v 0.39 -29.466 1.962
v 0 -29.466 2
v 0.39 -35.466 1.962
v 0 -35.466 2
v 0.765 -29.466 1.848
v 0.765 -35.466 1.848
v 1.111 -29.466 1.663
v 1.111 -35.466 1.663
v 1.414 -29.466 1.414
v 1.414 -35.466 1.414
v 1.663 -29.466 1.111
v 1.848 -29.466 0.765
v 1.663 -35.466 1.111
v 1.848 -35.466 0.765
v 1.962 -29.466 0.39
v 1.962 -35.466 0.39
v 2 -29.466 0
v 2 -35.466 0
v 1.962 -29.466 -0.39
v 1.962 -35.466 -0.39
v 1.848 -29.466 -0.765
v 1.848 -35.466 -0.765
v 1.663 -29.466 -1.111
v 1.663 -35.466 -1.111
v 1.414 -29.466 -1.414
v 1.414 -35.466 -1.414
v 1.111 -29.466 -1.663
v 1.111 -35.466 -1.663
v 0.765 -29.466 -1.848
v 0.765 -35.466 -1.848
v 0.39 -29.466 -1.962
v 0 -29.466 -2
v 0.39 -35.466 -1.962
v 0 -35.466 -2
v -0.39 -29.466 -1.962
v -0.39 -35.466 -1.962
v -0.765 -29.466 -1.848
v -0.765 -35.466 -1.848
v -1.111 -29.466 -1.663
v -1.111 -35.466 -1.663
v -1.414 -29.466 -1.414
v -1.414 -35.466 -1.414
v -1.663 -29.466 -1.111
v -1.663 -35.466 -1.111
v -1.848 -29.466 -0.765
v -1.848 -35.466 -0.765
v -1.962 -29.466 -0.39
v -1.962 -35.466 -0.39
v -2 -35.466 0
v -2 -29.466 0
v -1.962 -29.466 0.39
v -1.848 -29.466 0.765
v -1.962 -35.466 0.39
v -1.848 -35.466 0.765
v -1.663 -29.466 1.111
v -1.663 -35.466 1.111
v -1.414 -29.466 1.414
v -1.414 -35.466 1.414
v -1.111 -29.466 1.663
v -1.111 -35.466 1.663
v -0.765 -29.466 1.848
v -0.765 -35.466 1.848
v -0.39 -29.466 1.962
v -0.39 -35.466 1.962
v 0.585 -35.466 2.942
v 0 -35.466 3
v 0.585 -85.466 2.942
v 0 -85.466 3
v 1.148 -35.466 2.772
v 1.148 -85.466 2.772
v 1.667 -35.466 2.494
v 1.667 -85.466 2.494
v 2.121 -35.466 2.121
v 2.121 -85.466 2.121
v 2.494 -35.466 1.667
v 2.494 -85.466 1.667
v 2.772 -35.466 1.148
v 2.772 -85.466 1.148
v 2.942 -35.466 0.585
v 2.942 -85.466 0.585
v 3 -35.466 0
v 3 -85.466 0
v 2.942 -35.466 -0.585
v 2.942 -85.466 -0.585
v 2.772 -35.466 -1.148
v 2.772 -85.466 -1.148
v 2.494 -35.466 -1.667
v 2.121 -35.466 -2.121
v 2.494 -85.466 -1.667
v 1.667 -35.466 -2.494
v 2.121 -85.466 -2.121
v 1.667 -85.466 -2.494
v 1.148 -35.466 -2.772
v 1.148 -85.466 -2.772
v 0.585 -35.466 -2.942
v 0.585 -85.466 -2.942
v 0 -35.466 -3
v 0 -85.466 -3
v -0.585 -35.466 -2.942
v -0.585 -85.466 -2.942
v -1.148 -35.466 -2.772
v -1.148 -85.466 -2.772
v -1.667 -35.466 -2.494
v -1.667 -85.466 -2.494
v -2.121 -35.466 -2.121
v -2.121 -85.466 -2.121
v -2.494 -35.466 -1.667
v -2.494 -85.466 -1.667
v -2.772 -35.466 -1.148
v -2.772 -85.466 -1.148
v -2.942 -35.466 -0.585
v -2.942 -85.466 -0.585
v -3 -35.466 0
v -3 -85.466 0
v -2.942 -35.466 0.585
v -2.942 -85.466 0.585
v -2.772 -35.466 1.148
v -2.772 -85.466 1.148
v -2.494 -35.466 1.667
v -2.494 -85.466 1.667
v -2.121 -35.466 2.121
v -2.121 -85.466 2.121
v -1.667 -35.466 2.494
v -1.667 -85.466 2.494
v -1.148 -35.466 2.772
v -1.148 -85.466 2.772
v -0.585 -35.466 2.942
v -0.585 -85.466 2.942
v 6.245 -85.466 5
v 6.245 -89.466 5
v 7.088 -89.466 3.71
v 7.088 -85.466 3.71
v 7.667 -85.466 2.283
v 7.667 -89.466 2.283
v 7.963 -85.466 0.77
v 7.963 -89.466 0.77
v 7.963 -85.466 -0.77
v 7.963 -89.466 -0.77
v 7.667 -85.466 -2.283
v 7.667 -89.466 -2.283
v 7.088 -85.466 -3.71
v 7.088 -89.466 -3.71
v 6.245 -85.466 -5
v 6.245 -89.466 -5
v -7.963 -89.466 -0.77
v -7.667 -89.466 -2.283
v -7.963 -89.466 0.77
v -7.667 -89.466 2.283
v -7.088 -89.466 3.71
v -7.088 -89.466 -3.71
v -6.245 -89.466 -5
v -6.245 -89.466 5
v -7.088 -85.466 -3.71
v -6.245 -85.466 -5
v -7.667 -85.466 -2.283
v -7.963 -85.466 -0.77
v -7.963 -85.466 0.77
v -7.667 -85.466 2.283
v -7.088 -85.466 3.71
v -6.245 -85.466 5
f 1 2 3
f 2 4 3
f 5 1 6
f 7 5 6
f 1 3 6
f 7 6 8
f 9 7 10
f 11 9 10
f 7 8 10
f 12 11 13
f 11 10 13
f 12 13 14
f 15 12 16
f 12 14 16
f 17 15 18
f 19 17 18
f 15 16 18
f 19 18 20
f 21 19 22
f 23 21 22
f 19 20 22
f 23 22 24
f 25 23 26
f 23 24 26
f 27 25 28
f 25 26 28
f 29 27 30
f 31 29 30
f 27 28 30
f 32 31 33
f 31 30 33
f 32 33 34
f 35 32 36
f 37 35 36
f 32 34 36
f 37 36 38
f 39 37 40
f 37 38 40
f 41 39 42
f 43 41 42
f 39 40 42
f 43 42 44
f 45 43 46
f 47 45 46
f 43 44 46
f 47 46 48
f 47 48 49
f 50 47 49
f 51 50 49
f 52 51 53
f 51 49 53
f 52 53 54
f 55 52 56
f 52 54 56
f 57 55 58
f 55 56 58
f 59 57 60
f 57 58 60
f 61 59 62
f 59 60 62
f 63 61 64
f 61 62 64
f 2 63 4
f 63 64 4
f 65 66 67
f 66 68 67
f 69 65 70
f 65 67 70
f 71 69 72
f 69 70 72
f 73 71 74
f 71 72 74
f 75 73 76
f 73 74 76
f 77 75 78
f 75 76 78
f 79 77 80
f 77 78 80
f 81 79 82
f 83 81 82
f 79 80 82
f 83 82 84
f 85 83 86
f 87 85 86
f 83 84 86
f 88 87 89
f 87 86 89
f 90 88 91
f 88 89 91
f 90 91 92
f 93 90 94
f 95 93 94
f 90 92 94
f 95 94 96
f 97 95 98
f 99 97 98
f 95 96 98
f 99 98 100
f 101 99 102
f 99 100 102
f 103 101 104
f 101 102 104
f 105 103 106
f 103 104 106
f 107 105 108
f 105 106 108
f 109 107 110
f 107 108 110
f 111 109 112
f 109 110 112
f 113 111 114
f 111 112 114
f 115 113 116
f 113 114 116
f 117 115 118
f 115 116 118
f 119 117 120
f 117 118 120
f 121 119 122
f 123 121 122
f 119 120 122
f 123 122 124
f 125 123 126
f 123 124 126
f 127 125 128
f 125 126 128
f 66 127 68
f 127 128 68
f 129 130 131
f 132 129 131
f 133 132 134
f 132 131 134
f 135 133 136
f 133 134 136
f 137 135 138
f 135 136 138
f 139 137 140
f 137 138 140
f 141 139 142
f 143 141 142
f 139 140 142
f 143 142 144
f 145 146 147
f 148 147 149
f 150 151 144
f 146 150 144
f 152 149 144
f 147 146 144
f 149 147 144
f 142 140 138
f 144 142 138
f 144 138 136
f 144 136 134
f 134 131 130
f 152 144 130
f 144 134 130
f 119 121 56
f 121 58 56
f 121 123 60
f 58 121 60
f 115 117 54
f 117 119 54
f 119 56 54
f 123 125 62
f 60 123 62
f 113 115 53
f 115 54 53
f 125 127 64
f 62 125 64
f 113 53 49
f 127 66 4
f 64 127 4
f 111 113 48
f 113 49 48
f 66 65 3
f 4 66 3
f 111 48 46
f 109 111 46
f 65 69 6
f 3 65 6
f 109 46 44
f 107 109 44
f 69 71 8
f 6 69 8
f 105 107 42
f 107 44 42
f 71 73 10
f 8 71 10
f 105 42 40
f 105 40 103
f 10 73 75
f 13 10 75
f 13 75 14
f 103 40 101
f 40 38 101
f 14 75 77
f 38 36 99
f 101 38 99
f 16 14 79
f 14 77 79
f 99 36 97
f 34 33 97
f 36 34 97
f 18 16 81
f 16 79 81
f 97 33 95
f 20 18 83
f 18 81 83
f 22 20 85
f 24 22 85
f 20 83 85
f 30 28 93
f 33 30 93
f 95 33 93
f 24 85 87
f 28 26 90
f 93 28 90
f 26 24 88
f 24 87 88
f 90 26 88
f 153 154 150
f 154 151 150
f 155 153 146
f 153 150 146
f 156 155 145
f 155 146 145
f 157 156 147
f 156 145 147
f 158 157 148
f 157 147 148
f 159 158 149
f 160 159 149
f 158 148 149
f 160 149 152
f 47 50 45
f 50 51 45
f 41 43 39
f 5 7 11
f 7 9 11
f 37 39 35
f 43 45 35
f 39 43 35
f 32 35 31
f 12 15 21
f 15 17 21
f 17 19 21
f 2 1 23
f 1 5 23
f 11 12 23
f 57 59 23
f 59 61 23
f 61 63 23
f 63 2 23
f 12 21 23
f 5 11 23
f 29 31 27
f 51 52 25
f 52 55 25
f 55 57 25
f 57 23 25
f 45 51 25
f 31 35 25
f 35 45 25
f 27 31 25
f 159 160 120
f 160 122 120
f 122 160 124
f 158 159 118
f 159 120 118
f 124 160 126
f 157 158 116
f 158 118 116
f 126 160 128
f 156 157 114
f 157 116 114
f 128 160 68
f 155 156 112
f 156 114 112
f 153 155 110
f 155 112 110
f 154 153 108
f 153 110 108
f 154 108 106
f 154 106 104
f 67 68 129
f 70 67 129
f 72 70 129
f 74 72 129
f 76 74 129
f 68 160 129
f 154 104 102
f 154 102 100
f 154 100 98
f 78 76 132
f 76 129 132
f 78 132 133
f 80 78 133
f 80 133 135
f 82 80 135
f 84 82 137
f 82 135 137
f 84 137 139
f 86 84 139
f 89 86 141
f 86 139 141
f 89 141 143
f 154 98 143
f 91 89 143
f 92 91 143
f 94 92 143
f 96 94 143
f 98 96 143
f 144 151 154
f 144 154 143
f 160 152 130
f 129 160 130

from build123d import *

# Parameters (mm, degrees)
F3_W     = 19.09311
F3_H     = 4.934694
F3_H_2   = 4.746388
F4_DEPTH = 4


with BuildPart() as f2:
    # F0 (on Right) → F2 (revolve)
    with BuildSketch(Plane.YZ):
        Polygon((-89.465849, 8), (-89.465849, 0), (-29.465849, 0), (-29.465849, 2), (-35.465849, 2), (-35.465849, 3), (-85.465849, 3), (-85.465849, 8), align=None)
    revolve(axis=Axis((0, -60.270485, 0), (0, 1, 0)))

    # F3 (on face) → F4 (cut, through all)
    with BuildSketch(Plane.XZ.offset(89.465849)):
        with Locations((0.222466, 7.467347)):
            Rectangle(F3_W, F3_H)
        with Locations((0.222466, -7.373194)):
            Rectangle(F3_W, F3_H_2)
    extrude(amount=-F4_DEPTH, mode=Mode.SUBTRACT)


solid = f2.part
